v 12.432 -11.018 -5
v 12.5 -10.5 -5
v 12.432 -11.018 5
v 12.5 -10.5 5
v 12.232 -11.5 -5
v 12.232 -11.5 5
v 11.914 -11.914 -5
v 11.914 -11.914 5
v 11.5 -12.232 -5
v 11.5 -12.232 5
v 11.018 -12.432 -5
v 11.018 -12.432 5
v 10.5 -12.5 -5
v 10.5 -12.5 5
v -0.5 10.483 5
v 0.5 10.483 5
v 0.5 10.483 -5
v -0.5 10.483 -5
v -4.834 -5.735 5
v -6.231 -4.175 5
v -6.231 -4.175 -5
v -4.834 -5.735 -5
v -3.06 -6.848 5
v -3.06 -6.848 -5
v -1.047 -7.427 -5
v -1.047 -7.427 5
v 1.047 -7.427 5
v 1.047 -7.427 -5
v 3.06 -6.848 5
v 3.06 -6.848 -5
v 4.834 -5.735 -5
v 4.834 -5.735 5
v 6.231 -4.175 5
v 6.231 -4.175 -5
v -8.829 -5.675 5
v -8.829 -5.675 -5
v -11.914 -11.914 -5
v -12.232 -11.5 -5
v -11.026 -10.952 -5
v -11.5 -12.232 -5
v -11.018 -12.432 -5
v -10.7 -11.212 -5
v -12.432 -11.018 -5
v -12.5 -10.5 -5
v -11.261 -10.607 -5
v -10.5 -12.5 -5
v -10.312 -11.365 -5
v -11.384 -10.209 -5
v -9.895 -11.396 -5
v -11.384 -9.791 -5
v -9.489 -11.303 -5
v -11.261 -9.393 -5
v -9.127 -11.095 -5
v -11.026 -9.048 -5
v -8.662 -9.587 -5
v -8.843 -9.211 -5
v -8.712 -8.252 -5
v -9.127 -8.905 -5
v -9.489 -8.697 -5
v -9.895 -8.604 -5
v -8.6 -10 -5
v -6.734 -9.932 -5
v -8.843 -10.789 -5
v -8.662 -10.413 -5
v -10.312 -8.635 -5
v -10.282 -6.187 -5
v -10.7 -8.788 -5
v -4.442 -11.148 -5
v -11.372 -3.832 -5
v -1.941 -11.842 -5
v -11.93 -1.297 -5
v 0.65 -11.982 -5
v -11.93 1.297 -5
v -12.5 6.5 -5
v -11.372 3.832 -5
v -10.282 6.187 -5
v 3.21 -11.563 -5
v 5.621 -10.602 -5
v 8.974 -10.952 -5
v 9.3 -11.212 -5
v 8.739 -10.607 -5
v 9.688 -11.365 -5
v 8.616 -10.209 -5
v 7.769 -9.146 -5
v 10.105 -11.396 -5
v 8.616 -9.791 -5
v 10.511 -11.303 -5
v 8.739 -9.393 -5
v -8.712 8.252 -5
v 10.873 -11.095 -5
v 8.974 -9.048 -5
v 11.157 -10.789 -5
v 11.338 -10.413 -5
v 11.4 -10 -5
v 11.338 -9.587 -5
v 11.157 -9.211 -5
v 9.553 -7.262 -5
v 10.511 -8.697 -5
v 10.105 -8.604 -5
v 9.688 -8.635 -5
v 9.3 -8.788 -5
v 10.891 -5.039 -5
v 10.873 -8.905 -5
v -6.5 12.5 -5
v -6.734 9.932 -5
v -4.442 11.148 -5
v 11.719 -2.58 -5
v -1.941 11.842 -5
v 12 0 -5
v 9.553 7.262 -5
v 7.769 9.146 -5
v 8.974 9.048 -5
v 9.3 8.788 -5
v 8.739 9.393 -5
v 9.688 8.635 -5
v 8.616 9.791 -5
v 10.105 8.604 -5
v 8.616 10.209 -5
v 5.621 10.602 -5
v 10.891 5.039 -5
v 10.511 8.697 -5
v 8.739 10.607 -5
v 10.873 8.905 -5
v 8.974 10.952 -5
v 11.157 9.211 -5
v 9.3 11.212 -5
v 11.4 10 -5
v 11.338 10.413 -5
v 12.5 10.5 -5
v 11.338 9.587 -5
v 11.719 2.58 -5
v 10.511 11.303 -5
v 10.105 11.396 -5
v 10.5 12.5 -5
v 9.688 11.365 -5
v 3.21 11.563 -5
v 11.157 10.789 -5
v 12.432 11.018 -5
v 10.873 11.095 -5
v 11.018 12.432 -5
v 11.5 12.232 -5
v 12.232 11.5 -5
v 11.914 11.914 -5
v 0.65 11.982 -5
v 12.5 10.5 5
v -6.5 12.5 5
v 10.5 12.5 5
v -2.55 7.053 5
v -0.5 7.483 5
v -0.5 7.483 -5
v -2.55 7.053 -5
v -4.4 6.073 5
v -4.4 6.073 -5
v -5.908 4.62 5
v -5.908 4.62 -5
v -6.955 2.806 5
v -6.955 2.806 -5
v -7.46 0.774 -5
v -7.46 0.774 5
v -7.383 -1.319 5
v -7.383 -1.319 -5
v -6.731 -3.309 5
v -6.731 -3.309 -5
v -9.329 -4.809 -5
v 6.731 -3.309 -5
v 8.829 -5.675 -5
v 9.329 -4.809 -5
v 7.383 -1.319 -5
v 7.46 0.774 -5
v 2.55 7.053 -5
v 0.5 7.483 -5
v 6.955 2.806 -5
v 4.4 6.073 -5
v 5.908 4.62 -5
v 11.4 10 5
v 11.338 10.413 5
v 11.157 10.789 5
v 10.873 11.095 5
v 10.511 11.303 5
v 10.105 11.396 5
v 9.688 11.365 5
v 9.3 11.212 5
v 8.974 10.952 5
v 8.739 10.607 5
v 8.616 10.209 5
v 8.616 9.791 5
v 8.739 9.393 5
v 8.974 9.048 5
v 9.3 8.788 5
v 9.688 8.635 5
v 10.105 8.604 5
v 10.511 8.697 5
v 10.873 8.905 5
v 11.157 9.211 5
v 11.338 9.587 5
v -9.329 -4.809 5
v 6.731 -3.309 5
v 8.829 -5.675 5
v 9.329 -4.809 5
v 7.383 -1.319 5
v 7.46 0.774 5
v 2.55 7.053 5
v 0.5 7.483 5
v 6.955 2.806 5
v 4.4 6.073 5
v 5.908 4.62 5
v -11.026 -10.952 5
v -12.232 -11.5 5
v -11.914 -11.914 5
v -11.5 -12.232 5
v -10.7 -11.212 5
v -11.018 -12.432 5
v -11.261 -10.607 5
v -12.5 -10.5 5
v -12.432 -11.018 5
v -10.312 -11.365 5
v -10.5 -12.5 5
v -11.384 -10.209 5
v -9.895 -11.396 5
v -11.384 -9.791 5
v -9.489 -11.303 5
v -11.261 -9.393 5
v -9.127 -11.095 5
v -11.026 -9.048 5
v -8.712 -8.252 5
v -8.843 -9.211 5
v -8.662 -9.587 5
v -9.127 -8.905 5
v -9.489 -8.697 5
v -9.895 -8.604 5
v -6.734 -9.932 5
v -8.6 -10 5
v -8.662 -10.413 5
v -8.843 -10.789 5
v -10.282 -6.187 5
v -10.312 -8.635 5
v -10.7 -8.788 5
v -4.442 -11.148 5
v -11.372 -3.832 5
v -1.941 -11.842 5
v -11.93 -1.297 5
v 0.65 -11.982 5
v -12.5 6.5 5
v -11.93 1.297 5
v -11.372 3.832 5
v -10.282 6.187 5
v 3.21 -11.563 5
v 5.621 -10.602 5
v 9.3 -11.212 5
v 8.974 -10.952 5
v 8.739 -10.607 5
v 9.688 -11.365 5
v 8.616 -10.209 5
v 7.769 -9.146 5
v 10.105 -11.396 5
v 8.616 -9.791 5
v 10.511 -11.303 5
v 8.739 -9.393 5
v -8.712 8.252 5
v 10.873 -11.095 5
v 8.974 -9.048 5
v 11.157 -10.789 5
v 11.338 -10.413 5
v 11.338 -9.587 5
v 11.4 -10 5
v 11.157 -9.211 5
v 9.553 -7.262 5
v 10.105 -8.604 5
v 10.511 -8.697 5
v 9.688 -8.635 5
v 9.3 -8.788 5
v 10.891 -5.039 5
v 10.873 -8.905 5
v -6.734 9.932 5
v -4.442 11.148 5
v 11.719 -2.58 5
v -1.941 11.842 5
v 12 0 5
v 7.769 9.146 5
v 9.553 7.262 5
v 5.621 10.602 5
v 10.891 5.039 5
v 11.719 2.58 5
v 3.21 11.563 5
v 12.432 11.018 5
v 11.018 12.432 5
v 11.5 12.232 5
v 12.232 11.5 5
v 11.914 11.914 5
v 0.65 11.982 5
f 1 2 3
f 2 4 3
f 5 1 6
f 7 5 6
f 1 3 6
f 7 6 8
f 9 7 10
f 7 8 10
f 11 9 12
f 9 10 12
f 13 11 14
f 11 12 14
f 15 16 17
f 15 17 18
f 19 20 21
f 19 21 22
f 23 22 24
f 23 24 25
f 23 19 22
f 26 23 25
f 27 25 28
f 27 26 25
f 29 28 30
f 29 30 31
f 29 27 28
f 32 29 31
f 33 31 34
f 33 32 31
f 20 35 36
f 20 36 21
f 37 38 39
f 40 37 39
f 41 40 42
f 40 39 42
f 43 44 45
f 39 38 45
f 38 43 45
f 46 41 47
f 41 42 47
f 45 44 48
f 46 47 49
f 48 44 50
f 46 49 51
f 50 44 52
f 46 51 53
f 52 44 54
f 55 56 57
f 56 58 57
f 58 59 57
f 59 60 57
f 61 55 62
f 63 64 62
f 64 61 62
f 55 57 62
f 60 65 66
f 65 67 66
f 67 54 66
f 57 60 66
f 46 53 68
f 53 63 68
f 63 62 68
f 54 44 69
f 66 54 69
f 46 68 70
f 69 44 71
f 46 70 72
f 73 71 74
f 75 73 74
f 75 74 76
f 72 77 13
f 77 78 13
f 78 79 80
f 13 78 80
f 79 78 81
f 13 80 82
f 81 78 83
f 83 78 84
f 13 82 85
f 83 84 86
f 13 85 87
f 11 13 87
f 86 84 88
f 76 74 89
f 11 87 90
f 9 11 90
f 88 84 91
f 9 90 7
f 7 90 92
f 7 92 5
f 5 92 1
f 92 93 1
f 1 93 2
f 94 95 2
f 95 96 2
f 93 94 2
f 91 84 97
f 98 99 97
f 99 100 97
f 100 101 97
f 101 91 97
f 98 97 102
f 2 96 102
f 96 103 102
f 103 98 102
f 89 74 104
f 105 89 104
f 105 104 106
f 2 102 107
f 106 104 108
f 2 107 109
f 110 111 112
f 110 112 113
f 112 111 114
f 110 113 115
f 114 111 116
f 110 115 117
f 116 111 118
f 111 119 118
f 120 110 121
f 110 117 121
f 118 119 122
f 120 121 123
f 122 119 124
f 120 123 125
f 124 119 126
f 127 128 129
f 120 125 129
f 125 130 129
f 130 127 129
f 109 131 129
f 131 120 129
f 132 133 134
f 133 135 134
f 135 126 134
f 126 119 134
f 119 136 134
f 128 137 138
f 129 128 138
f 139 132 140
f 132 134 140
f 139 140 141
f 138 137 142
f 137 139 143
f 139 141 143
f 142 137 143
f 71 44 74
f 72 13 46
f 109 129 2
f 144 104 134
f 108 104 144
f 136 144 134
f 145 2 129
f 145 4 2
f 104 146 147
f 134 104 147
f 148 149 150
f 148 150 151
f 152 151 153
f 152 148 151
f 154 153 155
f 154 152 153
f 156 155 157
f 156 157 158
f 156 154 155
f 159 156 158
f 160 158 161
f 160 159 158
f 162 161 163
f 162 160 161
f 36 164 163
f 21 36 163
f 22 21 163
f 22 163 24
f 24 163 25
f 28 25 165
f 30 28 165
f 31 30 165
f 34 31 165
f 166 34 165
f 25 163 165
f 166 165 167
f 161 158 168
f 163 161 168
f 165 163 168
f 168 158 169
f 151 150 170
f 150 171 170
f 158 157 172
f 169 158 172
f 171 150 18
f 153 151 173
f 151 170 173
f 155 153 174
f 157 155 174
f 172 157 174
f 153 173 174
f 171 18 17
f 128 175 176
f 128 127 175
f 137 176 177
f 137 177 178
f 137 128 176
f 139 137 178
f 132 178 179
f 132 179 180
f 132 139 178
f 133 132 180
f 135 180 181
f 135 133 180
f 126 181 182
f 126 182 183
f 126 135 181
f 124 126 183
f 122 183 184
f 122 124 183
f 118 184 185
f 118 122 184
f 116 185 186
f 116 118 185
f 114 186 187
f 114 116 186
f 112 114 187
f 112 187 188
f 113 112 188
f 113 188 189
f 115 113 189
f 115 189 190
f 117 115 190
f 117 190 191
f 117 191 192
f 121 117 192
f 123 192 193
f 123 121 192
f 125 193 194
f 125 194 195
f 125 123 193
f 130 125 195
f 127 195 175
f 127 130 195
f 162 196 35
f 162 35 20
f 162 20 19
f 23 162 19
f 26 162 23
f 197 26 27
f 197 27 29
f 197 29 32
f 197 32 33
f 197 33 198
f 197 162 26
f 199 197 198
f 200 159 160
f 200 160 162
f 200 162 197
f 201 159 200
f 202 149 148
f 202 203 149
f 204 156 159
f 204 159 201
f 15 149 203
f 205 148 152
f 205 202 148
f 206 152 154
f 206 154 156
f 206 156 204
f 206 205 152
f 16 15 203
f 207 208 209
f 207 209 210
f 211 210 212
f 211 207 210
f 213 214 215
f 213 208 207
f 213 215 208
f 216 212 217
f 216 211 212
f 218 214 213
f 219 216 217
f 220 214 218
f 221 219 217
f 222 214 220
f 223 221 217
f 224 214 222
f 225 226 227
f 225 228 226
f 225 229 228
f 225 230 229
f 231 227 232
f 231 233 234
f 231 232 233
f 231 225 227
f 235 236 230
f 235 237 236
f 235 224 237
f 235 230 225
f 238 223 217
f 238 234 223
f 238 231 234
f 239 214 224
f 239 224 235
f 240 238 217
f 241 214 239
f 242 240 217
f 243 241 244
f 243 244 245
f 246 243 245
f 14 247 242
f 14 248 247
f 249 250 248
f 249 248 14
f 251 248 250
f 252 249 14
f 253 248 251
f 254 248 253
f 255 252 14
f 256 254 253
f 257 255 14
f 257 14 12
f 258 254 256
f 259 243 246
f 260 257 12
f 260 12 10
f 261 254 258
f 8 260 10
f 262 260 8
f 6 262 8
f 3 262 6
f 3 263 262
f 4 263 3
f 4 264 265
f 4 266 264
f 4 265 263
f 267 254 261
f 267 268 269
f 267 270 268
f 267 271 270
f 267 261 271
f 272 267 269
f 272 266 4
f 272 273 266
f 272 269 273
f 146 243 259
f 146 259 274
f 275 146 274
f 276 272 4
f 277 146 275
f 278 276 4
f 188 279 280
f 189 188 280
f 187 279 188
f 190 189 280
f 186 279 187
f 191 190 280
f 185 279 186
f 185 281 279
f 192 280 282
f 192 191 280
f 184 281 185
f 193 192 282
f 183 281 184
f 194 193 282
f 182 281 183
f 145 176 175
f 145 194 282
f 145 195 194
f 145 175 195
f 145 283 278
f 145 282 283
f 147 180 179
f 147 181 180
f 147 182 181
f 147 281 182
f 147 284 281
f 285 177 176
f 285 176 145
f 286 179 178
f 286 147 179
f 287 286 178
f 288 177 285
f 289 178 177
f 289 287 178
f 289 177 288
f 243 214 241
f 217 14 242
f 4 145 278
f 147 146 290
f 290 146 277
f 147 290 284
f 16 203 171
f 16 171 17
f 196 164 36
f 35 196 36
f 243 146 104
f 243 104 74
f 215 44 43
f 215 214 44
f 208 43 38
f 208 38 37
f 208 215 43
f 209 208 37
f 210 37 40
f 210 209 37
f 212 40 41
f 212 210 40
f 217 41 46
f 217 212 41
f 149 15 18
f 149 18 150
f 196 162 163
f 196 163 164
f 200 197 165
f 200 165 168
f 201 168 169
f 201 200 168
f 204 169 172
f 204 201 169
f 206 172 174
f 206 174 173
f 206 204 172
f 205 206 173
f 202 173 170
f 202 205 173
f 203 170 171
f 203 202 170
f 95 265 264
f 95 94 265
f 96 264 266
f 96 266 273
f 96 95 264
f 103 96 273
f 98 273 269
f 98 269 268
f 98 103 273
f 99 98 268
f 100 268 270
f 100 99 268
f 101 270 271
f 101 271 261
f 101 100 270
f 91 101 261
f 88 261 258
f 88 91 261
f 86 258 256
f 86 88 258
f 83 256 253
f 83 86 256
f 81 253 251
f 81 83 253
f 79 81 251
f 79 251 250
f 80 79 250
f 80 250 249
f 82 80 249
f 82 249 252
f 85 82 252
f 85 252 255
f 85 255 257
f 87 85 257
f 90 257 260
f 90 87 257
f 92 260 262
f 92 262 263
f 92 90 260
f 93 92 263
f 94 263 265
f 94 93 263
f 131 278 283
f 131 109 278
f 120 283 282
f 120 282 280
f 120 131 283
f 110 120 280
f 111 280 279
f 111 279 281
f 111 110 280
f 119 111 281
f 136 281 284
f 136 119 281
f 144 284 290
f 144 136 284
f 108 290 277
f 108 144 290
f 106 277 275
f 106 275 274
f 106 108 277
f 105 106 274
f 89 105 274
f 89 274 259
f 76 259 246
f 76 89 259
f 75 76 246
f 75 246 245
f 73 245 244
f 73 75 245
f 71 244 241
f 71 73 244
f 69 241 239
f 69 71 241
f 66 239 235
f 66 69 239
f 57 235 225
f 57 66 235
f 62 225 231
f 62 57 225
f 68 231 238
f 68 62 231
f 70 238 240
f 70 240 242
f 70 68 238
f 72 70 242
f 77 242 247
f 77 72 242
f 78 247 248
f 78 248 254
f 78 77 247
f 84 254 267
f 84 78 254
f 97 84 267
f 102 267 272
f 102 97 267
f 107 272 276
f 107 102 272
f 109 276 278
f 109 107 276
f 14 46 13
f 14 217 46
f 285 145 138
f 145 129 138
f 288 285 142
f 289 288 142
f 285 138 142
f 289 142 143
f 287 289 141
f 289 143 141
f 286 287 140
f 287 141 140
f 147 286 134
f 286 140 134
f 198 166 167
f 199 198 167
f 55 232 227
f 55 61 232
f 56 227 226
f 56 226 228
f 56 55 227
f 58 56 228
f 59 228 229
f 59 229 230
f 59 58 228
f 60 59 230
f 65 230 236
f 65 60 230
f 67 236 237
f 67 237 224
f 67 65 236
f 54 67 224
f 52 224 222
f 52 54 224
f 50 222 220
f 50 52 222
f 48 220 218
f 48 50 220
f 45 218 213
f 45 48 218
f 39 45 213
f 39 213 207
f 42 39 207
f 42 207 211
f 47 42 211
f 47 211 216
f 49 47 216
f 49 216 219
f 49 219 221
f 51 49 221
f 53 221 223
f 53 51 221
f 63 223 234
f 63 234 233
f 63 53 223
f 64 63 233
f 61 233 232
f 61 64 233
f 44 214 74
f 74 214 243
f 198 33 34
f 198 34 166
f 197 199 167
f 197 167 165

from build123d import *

# Parameters (mm, degrees)
SKETCH1_W                = 25
SKETCH1_H                = 25
SKETCH1_R                = 1.4
SKETCH1_R_2              = 12
BOSS_EXTRUDE1_DEPTH      = 5
BOSS_EXTRUDE1_DEPTH_BACK = 5
FILLET1_R                = 2
BOSS_EXTRUDE2_DEPTH      = 10
CUT_EXTRUDE1_DEPTH       = 11


with BuildPart() as part:
    # Sketch1 → Boss-Extrude1 (new body, two sides)
    with BuildSketch(Plane.XY) as boss_extrude1_sk:
        Rectangle(SKETCH1_W, SKETCH1_H)
        with Locations((10, 10)):
            Circle(SKETCH1_R, mode=Mode.SUBTRACT)
        with Locations((10, -10)):
            Circle(SKETCH1_R, mode=Mode.SUBTRACT)
        with Locations((-10, -10)):
            Circle(SKETCH1_R, mode=Mode.SUBTRACT)
        Circle(SKETCH1_R_2, mode=Mode.SUBTRACT)
    extrude(amount=BOSS_EXTRUDE1_DEPTH)
    extrude(boss_extrude1_sk.sketch, amount=-BOSS_EXTRUDE1_DEPTH_BACK)

    # Fillet1
    fillet1_edges = [part.edges().sort_by_distance(p)[0] for p in [
        (-12.5, 12.5, 0),
        (12.5, 12.5, 0),
        (12.5, -12.5, 0),
        (-12.5, -12.5, 0),
    ]]
    fillet(fillet1_edges, radius=FILLET1_R)

    # Sketch3 → Cut-Extrude1 (cut, through all)
    with BuildSketch(Plane.XY.offset(5)):
        with BuildLine():
            Line((-6.5, 12.5), (-12.5, 6.5))
            Line((-12.5, 6.5), (-12.5, 10.5))
            ThreePointArc((-12.5, 10.5), (-11.914213562, 11.914213562), (-10.5, 12.5))
            Line((-10.5, 12.5), (-6.5, 12.5))
        make_face()
    extrude(amount=-CUT_EXTRUDE1_DEPTH, mode=Mode.SUBTRACT)


with BuildPart() as body_2:
    # Sketch2 → Boss-Extrude2 (new body)
    with BuildSketch(Plane.XY.offset(5)):
        with BuildLine():
            Line((-6.730740698, -3.308644685), (-9.32881691, -4.808644685))
            Line((-9.32881691, -4.808644685), (-8.82881691, -5.674670089))
            Line((-8.82881691, -5.674670089), (-6.230740698, -4.174670089))
            ThreePointArc((-6.230740698, -4.174670089), (0, -7.5), (6.230740698, -4.174670089))
            Line((6.230740698, -4.174670089), (8.82881691, -5.674670089))
            Line((8.82881691, -5.674670089), (9.32881691, -4.808644685))
            Line((9.32881691, -4.808644685), (6.730740698, -3.308644685))
            ThreePointArc((6.730740698, -3.308644685), (6.495190528, 3.75), (0.5, 7.483314774))
            Line((0.5, 7.483314774), (0.5, 10.483314774))
            Line((0.5, 10.483314774), (-0.5, 10.483314774))
            Line((-0.5, 10.483314774), (-0.5, 7.483314774))
            ThreePointArc((-0.5, 7.483314774), (-6.495190528, 3.75), (-6.730740698, -3.308644685))
        make_face()
    extrude(amount=-BOSS_EXTRUDE2_DEPTH)


solid = Compound([part.part, body_2.part])
